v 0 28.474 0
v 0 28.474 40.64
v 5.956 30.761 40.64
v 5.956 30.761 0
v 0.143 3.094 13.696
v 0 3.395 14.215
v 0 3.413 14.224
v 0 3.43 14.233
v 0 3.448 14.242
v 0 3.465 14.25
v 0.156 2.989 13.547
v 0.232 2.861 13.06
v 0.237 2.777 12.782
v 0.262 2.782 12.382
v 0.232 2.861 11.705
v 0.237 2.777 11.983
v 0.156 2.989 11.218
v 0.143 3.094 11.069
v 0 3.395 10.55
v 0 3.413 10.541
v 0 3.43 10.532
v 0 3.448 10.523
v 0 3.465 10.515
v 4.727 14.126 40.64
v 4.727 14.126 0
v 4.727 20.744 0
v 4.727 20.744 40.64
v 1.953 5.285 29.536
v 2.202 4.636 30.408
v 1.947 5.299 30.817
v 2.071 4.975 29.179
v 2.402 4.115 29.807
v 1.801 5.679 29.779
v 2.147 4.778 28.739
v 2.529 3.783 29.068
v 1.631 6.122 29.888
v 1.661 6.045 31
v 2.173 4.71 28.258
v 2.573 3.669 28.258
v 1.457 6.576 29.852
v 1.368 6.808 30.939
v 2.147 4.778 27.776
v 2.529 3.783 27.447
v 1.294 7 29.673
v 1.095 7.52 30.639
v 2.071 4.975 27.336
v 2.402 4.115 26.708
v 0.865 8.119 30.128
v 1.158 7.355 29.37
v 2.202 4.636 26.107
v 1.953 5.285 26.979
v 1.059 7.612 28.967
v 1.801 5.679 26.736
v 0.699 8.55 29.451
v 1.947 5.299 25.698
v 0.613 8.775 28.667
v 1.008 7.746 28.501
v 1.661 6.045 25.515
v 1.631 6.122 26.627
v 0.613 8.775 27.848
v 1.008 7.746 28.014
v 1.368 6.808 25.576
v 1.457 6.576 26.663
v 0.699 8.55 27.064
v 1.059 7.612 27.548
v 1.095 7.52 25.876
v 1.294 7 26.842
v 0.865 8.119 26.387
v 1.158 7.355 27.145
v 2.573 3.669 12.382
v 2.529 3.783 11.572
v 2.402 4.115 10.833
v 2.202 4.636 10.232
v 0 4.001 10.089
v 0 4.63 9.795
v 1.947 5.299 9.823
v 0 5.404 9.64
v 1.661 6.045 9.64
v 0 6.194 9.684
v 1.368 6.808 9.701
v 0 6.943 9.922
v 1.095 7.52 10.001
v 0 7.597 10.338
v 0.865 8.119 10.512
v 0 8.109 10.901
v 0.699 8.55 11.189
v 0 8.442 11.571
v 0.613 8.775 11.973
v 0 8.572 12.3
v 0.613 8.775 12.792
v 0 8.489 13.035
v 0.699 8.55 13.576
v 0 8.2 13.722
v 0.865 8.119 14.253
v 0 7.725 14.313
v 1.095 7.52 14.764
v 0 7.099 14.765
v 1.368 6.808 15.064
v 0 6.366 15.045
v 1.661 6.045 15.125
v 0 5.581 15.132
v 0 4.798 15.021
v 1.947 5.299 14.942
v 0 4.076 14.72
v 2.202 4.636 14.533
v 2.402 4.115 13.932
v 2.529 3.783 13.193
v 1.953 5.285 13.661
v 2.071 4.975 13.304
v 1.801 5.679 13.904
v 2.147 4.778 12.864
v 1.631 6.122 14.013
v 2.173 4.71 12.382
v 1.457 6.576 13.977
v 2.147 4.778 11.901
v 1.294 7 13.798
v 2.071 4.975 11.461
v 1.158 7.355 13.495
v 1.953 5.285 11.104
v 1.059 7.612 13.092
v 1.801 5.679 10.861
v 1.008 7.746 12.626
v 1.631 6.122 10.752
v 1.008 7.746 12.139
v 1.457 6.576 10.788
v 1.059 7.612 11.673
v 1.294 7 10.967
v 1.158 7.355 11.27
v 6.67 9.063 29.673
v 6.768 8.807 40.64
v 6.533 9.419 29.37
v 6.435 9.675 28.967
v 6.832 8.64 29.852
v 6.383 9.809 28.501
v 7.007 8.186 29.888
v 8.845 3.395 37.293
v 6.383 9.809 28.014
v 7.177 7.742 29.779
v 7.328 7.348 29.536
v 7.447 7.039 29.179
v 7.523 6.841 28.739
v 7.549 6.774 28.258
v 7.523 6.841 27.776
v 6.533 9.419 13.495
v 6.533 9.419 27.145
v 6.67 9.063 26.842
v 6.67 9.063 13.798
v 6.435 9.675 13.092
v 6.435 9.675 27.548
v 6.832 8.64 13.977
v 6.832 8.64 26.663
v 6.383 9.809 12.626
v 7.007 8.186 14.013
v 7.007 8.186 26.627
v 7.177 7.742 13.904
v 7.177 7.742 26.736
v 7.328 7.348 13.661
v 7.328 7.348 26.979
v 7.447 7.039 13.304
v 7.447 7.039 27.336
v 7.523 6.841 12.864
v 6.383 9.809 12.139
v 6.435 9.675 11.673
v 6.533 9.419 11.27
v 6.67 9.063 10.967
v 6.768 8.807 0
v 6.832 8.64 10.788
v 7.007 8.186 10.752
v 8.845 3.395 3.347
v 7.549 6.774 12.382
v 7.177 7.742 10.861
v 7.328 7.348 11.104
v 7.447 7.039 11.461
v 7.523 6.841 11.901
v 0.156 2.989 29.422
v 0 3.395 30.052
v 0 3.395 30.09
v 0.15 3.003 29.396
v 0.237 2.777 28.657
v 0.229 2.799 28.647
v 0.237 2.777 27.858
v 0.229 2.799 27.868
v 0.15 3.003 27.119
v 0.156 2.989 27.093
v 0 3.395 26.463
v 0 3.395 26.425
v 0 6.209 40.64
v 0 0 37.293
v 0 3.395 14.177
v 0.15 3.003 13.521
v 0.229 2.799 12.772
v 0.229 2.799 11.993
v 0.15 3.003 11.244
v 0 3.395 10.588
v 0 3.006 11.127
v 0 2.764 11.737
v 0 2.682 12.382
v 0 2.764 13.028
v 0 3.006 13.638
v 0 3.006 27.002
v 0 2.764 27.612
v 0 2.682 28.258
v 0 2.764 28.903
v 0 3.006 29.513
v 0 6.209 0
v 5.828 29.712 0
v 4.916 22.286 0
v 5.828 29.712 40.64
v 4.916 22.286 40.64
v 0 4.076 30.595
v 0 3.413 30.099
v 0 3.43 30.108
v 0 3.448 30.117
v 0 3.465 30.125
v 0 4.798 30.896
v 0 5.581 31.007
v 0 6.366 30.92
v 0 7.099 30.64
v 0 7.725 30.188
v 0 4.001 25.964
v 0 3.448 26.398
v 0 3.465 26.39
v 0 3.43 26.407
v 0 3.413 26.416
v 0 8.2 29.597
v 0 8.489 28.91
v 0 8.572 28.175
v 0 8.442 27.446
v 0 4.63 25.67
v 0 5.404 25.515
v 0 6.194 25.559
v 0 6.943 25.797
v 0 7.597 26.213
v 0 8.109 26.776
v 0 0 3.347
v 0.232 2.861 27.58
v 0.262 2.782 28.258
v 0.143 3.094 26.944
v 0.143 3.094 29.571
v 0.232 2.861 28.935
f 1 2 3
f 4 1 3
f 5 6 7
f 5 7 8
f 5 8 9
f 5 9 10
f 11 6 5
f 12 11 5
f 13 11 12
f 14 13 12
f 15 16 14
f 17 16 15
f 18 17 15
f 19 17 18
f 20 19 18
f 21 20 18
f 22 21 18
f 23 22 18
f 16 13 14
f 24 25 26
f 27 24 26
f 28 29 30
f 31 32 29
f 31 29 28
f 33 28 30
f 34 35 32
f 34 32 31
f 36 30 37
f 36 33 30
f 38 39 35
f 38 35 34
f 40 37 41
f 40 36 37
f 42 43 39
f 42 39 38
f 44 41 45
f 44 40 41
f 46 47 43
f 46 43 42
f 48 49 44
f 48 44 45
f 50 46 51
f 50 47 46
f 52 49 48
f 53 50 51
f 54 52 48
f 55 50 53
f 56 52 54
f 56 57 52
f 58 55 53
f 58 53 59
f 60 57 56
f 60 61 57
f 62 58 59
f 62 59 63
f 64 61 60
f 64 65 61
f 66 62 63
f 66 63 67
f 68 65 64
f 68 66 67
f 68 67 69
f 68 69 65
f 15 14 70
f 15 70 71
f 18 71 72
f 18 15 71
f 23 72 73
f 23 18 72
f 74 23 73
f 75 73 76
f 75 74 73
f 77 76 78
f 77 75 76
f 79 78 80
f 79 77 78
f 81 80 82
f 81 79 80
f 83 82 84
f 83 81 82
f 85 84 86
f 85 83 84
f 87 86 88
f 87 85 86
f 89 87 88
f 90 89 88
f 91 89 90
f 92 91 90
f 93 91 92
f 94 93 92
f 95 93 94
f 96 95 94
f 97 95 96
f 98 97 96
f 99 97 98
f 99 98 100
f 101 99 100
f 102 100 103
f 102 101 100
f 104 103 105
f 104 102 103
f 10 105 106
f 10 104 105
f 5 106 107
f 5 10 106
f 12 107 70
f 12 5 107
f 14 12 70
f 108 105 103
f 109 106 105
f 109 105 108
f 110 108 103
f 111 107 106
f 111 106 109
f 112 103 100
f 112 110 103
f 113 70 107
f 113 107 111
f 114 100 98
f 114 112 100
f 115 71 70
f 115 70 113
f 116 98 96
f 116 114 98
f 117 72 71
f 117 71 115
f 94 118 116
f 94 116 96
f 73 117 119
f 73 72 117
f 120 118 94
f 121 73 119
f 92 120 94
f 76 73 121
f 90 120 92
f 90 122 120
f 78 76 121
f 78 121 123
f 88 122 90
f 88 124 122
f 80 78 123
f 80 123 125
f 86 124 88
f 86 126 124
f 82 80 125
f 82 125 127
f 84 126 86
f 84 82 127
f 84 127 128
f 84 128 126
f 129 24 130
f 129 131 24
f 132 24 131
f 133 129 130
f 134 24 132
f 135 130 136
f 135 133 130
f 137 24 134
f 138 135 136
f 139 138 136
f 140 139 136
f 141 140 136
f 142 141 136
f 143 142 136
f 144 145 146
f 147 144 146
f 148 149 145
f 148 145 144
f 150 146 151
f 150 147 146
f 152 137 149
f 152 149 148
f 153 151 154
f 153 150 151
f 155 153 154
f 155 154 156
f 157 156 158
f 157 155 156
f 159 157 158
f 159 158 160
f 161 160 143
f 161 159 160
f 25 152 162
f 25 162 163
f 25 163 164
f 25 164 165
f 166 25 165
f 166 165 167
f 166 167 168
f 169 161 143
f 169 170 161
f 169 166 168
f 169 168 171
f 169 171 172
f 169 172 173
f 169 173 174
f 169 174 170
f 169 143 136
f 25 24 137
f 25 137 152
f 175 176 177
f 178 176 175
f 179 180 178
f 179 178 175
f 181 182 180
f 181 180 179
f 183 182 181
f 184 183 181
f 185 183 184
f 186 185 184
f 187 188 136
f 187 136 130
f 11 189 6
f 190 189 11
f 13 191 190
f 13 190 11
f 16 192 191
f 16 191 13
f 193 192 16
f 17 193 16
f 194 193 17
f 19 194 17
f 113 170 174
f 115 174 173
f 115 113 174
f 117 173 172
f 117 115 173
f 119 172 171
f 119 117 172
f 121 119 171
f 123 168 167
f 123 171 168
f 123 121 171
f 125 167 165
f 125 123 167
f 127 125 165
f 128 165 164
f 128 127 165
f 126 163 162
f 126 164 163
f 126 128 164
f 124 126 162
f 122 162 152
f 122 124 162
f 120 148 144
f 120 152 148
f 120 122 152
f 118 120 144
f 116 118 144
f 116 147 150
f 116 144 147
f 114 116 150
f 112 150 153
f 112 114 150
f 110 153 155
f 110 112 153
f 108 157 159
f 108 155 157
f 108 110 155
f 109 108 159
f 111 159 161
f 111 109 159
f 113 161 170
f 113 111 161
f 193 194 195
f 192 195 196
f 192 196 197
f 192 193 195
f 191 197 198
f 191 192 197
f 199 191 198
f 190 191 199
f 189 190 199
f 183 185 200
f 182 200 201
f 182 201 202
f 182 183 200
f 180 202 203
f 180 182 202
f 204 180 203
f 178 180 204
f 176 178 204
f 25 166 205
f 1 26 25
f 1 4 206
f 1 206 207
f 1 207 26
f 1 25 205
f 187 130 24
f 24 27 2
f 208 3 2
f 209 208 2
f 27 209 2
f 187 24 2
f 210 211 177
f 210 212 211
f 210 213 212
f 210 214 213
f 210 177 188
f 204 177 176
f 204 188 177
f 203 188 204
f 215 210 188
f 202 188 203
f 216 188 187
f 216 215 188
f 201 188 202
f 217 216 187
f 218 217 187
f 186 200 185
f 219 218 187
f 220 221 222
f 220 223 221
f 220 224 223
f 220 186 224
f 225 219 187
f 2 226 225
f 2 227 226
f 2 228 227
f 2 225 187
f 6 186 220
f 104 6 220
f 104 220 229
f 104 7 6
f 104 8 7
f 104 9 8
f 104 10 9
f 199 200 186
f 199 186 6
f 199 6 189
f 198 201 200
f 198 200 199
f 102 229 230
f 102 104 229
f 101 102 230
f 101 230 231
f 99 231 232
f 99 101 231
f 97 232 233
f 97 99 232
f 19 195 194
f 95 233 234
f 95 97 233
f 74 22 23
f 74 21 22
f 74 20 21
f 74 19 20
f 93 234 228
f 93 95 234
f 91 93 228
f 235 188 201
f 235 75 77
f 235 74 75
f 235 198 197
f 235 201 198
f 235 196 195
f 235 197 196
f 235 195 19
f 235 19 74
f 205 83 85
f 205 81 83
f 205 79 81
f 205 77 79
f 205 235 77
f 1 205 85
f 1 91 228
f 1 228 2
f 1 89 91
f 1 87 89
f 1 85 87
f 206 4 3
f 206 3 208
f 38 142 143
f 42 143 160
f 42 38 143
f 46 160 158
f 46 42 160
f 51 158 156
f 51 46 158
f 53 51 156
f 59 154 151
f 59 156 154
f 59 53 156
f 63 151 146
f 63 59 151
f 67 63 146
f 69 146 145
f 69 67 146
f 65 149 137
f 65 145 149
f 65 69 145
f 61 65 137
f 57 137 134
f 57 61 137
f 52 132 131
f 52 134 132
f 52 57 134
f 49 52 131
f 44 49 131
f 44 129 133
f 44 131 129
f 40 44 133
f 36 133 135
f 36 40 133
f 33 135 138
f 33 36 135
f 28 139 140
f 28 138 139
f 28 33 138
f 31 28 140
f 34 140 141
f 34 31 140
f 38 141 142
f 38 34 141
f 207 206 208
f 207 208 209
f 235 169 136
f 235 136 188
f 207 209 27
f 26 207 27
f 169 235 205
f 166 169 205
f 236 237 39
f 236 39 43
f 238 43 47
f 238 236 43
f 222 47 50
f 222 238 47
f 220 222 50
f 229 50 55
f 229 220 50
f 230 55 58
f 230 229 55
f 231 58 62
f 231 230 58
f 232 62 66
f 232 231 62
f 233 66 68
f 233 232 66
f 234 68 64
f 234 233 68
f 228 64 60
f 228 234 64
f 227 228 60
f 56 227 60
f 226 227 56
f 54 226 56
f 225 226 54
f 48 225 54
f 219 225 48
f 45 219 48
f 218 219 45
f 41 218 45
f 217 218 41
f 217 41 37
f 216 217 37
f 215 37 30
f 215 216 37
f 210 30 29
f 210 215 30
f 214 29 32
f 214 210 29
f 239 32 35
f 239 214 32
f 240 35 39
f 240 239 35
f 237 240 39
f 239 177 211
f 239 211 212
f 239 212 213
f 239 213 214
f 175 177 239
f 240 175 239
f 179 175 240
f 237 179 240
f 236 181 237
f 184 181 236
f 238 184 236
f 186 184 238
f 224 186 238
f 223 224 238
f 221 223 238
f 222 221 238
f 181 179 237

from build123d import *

# Parameters (mm, degrees)
EXTRUDE_1020_DEPTH     = 40.639999
CUT_EXTRUDE_START      = -9.474731536
CUT_EXTRUDE_1457_DEPTH = 9.474731536
SKETCH_5_6_R           = 1.631950308
EXTRUDE_1503_DEPTH     = 8.257914
CUT_EXTRUDE_2395_REACH = 52.464
SKETCH_11_R            = 2.75
CUT_EXTRUDE_2_REACH    = 52.464
SKETCH_18_R            = 2.75


# Read off the part's stored shape, not the designer's step: 切割边缘
with BuildPart() as part:
    # Sketch 255 → Extrude 1020 (new body)
    with BuildSketch(Plane.XY):
        Polygon((4.726521015, 20.743641369), (4.726521015, 19.19011116), (4.726521015, 14.125546455), (8.845423698, 3.395440102), (0, -5.59e-07), (0, 28.474460602), (5.956491721, 30.760943971), (5.827697754, 29.712001801), (4.915848732, 22.285591125), align=None)
    extrude(amount=EXTRUDE_1020_DEPTH)

    # Cut-Extrude 1457 outline → Cut-Extrude 1457 (cut)
    with BuildSketch(Plane(origin=(8.845423511, 3.395440589, 0), x_dir=(0, 0, -1), z_dir=(0.9335804043176853, 0.35836800732491086, 0)).offset(CUT_EXTRUDE_START)):
        Polygon((-37.293439923, -5.22e-07), (-40.63999939, 5.796406388), (-40.63999939, -5.22e-07), align=None)
    cut_extrude_1457 = extrude(amount=CUT_EXTRUDE_1457_DEPTH, mode=Mode.SUBTRACT)

    # 草图5<6> → Extrude 1503 (add)
    with BuildSketch(Plane(origin=(8.845423511, 3.395440589, 0), x_dir=(0, 0, -1), z_dir=(0.9335804043176853, 0.35836800732491086, 0))):
        with Locations(Location((-28.25750129, 5.25344969, 0), (0, 0, 90))):
            Circle(SKETCH_5_6_R)
    extrude_1503 = extrude(amount=-EXTRUDE_1503_DEPTH)

    # 镜向6: Cut-Extrude 1457, Extrude 1503 across plane
    add(cut_extrude_1457.mirror(Plane.XY.offset(20.319999695)), mode=Mode.SUBTRACT)
    add(extrude_1503.mirror(Plane.XY.offset(20.319999695)))

    # 草图10 → M2.5 凹头盖螺钉的柱形沉头孔2 (revolve, cut)
    with BuildSketch(Plane(origin=(-0.746671694, 5.340586006, 28.25750129), x_dir=(0.3583680073249109, -0.9335804043176852, 0), z_dir=(0, 0, 1))):
        Polygon((0, 0), (0, 18.064835324), (1.635, 18.064835324), (1.635, 2.5), (2.75, 2.5), (2.75, 0.025), (2.775, 0), align=None)
    revolve(axis=Axis((-6.674907261, 3.06494916, 28.25750129), (0.9335804043176852, 0.358368007324911, 0)), mode=Mode.SUBTRACT)

    # 草图11 → Cut-Extrude 2395 (cut, up to next)
    with BuildSketch(Plane(origin=(3.469947614, 1.331988339, 0), x_dir=(0, 0, 1), z_dir=(-0.9335804043176853, -0.3583680073249109, 0)), mode=Mode.PRIVATE) as cut_extrude_2395_sk1:
        with Locations(Location((28.25750129, 5.25344969, 0), (0, 0, 270))):
            Circle(SKETCH_11_R)
    cut_extrude_2395_tool1 = extrude(cut_extrude_2395_sk1.sketch, amount=CUT_EXTRUDE_2395_REACH, mode=Mode.PRIVATE) & part.part
    add(cut_extrude_2395_tool1.solids().sort_by_distance((1.587279, 6.236506, 28.257501))[0], mode=Mode.SUBTRACT)

    # 草图17 → M2.5 凹头盖螺钉的柱形沉头孔5 (revolve, cut)
    with BuildSketch(Plane(origin=(-0.746671694, 5.340586006, 12.3824981), x_dir=(0.3583680073249109, -0.9335804043176852, 0), z_dir=(0, 0, 1))):
        Polygon((0, 0), (0, 18.064835324), (1.635, 18.064835324), (1.635, 2.5), (2.75, 2.5), (2.75, 0.025), (2.775, 0), align=None)
    revolve(axis=Axis((-6.674907261, 3.06494916, 12.3824981), (0.9335804043176852, 0.358368007324911, 0)), mode=Mode.SUBTRACT)

    # 草图18 → 修整螺丝2 (cut, up to next)
    with BuildSketch(Plane(origin=(3.469947614, 1.331988339, 0), x_dir=(0, 0, 1), z_dir=(-0.9335804043176853, -0.3583680073249109, 0)), mode=Mode.PRIVATE) as cut_extrude_2_sk1:
        with Locations(Location((12.3824981, 5.25344969, 0), (0, 0, 270))):
            Circle(SKETCH_18_R)
    cut_extrude_2_tool1 = extrude(cut_extrude_2_sk1.sketch, amount=CUT_EXTRUDE_2_REACH, mode=Mode.PRIVATE) & part.part
    add(cut_extrude_2_tool1.solids().sort_by_distance((1.587279, 6.236506, 12.382498))[0], mode=Mode.SUBTRACT)


solid = part.part
